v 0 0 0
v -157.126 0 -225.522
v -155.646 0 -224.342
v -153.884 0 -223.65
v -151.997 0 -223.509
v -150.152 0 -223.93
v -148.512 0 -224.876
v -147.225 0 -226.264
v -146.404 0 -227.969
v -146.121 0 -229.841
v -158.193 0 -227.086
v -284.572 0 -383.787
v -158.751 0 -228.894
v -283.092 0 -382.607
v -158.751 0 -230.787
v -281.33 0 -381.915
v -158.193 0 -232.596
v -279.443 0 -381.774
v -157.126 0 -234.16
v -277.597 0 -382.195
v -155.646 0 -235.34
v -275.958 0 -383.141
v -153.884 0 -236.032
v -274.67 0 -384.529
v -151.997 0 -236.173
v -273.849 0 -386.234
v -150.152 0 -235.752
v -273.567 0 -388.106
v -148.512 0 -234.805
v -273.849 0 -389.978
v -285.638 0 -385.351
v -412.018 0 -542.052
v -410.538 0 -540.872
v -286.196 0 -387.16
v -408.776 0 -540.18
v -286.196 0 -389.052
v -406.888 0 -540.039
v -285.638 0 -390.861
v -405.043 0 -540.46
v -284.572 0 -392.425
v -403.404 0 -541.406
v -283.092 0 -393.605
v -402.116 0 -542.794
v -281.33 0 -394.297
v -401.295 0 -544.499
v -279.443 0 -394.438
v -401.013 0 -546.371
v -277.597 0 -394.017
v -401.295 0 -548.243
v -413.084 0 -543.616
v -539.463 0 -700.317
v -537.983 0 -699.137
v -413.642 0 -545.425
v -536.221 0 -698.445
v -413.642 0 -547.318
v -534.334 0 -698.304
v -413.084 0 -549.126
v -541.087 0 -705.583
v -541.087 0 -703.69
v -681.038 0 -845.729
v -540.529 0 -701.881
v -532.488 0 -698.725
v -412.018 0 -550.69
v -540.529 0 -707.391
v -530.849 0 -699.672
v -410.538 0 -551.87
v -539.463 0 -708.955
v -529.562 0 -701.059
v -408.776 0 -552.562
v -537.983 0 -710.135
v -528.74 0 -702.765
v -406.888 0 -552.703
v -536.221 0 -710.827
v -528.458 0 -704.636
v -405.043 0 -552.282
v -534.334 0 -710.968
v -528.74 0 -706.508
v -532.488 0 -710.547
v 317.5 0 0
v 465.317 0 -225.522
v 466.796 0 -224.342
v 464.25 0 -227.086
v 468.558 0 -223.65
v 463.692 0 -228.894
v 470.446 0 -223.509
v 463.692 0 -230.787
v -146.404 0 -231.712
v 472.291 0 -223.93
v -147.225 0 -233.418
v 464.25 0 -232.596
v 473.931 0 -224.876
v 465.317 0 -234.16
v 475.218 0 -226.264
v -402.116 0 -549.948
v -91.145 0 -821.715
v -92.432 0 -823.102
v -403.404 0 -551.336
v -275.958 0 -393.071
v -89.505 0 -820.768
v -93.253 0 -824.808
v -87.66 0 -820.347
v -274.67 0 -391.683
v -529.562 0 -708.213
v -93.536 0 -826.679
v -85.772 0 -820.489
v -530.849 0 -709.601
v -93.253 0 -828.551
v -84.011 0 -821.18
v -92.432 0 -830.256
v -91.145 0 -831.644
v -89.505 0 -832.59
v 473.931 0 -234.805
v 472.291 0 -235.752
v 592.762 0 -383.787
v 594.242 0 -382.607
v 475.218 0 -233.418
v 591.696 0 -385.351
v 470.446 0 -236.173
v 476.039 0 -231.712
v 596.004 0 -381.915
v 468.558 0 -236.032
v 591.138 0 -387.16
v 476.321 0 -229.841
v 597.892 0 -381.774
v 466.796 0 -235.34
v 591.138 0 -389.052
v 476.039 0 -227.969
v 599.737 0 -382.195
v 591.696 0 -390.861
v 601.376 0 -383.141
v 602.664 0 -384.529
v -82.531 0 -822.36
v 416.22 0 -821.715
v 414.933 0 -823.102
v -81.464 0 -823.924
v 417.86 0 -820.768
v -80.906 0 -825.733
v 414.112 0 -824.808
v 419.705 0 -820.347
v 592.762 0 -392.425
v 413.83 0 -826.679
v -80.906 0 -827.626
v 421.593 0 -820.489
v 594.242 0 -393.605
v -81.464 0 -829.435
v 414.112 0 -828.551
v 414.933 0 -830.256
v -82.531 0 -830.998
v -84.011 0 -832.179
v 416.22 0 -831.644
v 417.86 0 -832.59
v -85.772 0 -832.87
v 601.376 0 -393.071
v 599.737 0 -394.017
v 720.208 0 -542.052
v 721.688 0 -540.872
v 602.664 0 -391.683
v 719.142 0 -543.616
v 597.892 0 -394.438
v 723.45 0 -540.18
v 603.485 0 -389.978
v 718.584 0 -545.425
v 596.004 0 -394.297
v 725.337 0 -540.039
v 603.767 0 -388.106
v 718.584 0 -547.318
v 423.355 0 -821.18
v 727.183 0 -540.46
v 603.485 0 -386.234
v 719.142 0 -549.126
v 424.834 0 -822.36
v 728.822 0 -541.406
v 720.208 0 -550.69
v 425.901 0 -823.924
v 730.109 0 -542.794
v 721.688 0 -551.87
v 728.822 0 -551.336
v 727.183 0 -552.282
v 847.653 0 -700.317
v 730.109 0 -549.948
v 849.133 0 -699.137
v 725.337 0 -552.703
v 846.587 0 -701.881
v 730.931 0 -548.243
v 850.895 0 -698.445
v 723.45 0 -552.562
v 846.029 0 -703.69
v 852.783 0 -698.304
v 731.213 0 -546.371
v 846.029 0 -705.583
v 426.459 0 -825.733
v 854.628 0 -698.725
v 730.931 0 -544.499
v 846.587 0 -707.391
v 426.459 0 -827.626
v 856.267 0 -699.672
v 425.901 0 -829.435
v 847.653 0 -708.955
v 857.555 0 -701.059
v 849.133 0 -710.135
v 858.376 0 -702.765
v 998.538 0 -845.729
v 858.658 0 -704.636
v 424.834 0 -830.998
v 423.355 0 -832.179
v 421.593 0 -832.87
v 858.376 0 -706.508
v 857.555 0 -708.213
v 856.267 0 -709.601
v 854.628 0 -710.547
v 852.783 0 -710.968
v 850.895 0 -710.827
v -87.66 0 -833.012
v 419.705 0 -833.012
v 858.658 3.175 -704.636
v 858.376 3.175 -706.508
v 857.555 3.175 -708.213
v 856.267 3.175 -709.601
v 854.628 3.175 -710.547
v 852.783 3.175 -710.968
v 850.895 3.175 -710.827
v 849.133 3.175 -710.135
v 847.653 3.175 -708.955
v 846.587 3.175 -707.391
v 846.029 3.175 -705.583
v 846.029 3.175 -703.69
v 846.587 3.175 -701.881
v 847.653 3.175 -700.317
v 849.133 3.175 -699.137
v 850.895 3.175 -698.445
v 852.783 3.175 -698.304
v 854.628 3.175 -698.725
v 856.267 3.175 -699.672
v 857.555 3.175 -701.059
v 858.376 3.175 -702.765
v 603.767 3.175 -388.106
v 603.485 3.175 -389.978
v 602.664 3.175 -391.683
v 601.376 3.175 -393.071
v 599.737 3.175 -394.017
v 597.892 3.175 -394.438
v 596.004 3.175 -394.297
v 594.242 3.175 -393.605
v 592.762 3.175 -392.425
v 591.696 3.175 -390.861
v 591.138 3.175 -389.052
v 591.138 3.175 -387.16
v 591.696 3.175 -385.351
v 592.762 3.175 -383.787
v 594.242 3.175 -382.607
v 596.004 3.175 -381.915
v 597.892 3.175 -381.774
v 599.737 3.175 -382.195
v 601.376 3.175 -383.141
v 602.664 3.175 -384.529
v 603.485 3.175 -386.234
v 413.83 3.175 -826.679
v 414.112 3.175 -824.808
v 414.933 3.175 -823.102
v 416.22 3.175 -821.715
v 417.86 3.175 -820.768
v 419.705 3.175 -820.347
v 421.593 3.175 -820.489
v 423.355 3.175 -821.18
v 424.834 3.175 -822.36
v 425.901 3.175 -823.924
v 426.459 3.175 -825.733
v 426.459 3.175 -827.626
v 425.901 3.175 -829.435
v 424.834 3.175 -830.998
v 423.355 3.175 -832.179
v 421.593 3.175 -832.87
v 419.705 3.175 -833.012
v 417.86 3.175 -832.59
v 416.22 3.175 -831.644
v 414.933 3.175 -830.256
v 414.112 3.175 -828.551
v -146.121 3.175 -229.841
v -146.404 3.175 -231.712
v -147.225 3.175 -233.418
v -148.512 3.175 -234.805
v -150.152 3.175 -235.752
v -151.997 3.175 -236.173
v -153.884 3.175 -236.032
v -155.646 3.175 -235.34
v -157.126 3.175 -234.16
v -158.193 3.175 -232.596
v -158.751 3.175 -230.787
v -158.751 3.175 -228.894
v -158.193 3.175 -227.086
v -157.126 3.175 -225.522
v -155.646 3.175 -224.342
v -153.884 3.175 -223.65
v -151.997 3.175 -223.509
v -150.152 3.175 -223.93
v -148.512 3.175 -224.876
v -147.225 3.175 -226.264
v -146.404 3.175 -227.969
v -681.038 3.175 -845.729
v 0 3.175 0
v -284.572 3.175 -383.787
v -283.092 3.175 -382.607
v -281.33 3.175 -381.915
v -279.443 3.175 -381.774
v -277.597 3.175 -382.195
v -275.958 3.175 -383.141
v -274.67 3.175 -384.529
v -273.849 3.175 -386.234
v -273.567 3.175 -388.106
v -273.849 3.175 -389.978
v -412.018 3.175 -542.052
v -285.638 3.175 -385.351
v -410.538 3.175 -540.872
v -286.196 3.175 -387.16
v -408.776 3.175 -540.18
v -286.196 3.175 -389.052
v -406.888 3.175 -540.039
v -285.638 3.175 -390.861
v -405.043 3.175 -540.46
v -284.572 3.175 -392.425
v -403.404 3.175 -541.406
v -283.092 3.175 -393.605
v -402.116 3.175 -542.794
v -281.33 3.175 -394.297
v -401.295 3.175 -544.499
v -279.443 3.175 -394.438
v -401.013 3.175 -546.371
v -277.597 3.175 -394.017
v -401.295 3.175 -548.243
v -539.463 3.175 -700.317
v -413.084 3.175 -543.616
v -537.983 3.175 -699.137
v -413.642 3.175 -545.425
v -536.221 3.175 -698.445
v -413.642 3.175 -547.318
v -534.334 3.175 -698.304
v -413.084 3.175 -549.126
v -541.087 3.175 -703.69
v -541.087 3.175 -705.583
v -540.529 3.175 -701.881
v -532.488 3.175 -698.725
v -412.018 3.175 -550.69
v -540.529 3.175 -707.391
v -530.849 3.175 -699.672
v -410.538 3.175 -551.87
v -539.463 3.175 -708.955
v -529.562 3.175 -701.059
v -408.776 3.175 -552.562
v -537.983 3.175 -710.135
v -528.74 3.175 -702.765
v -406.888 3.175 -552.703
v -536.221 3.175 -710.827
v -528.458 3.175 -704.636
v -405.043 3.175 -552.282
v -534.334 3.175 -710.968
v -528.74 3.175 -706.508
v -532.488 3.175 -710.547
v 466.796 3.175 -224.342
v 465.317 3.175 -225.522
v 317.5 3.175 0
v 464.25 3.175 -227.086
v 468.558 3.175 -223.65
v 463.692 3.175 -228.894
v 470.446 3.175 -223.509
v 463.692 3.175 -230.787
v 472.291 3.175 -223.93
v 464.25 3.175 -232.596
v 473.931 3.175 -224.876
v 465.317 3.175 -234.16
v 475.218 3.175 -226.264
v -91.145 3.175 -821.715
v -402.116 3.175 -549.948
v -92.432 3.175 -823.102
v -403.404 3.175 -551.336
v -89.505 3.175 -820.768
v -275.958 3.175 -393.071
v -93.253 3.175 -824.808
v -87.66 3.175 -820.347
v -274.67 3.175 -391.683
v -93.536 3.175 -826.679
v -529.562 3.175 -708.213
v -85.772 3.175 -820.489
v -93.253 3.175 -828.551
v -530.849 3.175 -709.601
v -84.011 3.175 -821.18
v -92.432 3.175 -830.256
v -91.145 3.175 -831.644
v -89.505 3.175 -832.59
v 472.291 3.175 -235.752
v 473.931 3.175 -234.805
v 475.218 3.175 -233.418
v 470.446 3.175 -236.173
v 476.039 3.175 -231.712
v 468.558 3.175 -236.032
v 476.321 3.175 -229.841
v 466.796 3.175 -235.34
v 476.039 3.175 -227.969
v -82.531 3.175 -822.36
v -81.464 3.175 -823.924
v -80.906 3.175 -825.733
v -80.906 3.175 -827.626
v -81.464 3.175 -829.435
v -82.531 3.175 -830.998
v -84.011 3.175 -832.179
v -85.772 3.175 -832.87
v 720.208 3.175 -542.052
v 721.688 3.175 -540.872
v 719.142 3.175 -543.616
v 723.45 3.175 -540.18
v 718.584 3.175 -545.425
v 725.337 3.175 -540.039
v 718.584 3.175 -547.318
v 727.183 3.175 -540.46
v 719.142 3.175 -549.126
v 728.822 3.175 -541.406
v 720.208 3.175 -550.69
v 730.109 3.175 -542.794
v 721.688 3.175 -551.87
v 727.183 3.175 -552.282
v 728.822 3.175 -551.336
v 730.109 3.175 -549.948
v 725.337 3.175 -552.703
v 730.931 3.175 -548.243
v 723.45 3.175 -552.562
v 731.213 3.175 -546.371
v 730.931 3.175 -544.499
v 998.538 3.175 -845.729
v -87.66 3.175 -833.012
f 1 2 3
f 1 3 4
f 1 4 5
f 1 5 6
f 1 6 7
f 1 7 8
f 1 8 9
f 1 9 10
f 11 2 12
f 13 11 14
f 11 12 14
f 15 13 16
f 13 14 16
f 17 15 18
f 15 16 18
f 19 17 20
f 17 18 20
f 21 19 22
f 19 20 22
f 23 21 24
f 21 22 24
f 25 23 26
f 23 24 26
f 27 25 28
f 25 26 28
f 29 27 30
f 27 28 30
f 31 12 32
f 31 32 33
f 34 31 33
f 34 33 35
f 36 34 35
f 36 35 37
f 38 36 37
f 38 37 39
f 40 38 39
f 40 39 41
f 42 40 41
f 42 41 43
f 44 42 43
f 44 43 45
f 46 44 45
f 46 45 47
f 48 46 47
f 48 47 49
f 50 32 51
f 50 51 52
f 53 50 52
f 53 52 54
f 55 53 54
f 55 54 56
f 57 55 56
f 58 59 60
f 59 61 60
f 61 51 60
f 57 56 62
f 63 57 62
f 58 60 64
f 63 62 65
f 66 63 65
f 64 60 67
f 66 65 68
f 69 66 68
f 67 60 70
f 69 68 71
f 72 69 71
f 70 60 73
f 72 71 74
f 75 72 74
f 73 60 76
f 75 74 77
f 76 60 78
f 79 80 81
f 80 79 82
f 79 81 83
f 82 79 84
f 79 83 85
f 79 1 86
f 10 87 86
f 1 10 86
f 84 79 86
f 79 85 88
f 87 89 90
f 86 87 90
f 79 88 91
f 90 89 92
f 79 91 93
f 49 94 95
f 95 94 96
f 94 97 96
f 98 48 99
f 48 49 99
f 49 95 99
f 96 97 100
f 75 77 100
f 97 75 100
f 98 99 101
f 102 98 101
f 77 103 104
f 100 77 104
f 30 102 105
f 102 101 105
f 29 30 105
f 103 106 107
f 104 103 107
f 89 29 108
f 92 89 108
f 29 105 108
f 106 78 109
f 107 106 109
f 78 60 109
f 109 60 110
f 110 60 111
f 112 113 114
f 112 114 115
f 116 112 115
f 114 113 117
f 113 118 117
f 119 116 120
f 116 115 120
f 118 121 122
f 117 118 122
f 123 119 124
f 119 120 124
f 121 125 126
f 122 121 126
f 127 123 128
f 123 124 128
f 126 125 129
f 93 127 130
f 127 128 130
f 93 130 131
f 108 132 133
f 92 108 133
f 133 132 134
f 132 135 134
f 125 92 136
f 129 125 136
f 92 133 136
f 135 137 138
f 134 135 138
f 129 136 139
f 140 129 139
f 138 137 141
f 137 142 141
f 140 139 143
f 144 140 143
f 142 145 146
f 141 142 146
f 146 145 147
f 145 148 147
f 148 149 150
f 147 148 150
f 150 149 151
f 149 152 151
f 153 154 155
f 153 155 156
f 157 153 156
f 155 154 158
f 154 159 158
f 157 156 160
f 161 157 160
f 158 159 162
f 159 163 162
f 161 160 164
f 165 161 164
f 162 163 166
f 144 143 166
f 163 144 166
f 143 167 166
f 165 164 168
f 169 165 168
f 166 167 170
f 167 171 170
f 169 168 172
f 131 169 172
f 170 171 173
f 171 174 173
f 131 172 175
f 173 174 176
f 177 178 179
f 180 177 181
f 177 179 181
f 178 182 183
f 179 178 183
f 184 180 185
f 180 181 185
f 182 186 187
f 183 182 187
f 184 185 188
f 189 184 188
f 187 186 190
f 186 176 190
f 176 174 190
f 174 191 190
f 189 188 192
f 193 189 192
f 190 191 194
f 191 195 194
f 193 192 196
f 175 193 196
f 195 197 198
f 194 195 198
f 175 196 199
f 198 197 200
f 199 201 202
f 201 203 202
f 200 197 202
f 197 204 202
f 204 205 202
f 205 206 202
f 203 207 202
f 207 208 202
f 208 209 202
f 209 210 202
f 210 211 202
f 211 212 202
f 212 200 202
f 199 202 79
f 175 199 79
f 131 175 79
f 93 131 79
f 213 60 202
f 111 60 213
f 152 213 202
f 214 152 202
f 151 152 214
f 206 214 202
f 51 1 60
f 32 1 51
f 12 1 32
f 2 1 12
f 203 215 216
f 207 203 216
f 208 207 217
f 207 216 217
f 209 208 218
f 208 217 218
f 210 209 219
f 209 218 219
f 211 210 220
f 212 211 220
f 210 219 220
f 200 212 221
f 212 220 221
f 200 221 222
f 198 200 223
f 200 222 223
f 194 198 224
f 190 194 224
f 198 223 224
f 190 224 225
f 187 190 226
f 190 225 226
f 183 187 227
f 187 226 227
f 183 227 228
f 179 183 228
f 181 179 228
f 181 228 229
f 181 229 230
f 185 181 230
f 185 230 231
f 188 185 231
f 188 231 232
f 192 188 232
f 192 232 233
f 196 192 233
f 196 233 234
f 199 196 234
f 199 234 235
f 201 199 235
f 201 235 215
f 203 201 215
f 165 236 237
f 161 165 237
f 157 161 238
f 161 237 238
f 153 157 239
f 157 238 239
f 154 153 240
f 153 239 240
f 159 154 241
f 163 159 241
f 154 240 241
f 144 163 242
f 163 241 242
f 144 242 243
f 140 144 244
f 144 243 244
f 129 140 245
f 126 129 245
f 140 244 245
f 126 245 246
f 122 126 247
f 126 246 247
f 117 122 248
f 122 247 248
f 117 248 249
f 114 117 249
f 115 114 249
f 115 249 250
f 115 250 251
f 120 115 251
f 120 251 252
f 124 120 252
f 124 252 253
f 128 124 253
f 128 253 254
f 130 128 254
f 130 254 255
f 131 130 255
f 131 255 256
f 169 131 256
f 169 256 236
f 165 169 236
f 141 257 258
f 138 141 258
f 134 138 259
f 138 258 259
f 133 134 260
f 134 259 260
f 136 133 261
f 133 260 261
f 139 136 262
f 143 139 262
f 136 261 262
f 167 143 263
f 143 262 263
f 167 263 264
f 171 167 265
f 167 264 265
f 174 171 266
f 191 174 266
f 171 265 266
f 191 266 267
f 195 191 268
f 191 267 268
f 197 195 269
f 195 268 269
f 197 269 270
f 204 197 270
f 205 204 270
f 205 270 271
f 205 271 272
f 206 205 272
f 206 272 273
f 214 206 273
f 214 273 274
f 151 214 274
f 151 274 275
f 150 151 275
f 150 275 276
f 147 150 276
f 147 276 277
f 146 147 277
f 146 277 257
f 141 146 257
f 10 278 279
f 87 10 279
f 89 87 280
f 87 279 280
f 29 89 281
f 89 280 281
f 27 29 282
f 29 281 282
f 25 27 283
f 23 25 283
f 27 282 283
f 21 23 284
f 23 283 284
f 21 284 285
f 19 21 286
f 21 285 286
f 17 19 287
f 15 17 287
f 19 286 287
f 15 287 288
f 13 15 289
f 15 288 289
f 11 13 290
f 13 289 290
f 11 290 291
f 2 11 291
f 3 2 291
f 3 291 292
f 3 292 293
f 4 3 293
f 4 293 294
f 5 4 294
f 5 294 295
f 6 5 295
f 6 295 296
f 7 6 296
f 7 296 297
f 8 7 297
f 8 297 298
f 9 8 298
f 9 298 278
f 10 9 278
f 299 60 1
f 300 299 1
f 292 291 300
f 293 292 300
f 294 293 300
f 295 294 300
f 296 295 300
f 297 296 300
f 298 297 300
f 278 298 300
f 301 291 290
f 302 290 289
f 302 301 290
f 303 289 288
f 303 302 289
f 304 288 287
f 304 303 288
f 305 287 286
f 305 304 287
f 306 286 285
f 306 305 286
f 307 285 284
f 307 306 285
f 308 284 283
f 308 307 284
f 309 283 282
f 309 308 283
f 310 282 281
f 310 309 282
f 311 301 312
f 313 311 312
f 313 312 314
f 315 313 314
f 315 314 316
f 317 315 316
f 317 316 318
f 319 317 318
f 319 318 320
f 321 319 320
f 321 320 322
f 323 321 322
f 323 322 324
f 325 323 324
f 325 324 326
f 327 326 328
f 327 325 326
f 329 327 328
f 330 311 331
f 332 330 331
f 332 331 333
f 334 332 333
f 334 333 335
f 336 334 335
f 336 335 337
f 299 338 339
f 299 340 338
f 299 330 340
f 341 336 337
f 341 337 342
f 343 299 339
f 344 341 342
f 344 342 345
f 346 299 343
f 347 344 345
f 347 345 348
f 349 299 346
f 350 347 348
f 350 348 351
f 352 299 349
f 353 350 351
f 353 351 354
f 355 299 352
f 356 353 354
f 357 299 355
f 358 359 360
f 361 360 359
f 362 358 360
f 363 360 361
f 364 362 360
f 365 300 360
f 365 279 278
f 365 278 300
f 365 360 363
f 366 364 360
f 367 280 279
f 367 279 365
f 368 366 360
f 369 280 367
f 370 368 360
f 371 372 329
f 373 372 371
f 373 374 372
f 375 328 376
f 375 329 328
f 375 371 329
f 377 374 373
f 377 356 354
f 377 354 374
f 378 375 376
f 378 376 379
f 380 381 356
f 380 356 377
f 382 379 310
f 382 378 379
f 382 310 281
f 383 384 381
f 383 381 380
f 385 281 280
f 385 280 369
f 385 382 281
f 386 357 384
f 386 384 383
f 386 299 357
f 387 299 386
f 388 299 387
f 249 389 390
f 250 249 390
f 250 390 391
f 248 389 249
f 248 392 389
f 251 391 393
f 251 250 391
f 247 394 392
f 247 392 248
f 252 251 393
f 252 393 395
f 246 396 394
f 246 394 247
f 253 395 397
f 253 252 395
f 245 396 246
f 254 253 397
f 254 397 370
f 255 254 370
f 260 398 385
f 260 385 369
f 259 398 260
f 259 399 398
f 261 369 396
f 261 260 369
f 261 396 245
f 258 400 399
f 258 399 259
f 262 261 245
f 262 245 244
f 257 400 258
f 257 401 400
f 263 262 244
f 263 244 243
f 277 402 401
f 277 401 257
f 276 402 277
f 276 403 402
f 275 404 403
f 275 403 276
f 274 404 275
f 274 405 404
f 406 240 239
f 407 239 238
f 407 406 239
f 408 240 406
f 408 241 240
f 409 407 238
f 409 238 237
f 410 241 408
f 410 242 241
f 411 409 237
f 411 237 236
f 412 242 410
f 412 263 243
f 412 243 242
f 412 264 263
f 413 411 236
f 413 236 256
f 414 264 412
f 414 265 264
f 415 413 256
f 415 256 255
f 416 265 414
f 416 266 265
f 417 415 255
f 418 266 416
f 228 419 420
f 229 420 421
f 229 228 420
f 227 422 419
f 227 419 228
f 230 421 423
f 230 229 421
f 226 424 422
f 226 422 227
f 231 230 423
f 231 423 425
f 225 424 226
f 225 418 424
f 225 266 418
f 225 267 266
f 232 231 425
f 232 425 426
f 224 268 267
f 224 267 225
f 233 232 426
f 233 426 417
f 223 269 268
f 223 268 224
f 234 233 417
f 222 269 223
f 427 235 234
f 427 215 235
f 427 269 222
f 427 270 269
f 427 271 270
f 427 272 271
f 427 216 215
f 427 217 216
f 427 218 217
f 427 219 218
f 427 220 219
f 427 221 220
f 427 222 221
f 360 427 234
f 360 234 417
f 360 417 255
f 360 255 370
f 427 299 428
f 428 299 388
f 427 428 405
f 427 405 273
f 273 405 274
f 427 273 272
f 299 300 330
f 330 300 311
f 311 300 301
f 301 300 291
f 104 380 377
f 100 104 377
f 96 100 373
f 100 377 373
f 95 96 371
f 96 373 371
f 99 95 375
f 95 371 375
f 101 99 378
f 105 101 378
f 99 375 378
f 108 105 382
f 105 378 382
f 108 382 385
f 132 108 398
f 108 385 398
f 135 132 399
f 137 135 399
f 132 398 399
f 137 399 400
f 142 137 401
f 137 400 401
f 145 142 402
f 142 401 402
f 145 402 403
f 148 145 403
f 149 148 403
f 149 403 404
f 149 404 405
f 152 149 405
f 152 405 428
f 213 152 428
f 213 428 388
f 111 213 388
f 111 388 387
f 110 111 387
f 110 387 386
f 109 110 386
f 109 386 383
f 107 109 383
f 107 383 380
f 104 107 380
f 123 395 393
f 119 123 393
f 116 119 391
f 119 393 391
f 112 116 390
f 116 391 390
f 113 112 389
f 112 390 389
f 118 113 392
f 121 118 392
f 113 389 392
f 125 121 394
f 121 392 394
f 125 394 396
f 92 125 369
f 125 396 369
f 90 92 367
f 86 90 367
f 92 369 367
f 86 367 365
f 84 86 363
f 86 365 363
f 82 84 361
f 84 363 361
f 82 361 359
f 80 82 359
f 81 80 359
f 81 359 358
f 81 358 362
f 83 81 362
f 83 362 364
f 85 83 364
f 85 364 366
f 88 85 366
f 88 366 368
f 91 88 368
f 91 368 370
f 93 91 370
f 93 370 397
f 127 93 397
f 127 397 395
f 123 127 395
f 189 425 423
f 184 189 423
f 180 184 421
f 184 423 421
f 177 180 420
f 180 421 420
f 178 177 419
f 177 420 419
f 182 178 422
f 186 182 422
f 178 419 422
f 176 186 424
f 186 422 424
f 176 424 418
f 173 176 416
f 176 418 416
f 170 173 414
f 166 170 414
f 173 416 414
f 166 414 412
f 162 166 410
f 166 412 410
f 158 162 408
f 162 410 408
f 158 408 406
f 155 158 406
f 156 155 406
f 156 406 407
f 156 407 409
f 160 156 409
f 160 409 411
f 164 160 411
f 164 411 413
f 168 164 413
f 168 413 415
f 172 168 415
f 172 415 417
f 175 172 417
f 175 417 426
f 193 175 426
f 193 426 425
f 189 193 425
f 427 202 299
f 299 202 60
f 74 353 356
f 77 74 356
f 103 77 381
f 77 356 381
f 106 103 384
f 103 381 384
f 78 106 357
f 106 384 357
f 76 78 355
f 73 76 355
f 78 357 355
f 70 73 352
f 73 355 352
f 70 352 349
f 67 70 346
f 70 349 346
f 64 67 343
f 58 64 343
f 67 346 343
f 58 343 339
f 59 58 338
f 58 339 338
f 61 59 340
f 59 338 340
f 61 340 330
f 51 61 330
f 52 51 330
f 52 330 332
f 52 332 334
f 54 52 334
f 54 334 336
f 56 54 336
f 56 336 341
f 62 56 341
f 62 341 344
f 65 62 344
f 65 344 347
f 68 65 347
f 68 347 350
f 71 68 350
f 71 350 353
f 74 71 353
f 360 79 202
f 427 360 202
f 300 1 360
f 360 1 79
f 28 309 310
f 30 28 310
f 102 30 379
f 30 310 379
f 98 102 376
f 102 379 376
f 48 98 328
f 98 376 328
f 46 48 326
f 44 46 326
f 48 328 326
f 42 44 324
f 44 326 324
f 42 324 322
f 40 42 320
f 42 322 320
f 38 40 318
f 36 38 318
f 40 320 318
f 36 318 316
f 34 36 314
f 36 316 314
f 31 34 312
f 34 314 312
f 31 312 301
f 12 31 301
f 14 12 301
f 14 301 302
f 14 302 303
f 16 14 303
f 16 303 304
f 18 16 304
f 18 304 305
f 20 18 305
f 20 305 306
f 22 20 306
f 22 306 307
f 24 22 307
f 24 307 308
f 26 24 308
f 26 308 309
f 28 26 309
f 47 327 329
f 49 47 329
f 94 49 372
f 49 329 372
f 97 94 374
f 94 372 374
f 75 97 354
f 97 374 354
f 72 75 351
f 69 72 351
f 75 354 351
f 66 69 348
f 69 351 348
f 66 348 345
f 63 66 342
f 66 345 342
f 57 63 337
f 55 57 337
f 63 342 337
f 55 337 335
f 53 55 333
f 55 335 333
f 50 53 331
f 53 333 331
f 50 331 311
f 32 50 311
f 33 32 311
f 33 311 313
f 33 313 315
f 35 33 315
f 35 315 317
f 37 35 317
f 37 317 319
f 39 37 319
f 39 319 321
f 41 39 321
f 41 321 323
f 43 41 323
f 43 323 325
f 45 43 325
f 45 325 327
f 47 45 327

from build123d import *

# Parameters (mm, degrees)
BOSS_EXTRUDE1_DEPTH = 3.175
CUT_EXTRUDE1_REACH  = 5.175
SKETCH2_R           = 6.35
SKETCH4_R           = 6.35
CUT_EXTRUDE2_DEPTH  = 4.175


with BuildPart() as part:
    # Sketch1 → Boss-Extrude1 (new body)
    with BuildSketch(Plane(origin=(0, 0, 0), x_dir=(1, 0, 0), z_dir=(0, 1, 0))):
        Polygon((0, 0), (317.5, 0), (998.5375, 845.729357474), (-681.0375, 845.729357474), align=None)
    extrude(amount=BOSS_EXTRUDE1_DEPTH)

    # Sketch2 → Cut-Extrude1 (cut, up to next)
    with BuildSketch(Plane(origin=(0, 3.175, 0), x_dir=(-1, 0, 0), z_dir=(0, 1, 0)), mode=Mode.PRIVATE) as cut_extrude1_sk1:
        with Locations((87.1855, -826.679357474)):
            Circle(SKETCH2_R)
    cut_extrude1_tool1 = extrude(cut_extrude1_sk1.sketch, amount=-CUT_EXTRUDE1_REACH, mode=Mode.PRIVATE) & part.part
    add(cut_extrude1_tool1.solids().sort_by_distance((-87.1855, 3.175, -826.679357))[0], mode=Mode.SUBTRACT)
    # Sketch2 → Cut-Extrude1 (cut, up to next)
    with BuildSketch(Plane(origin=(0, 3.175, 0), x_dir=(-1, 0, 0), z_dir=(0, 1, 0)), mode=Mode.PRIVATE) as cut_extrude1_sk2:
        with Locations((-420.1795, -826.679357474)):
            Circle(SKETCH2_R)
    cut_extrude1_tool2 = extrude(cut_extrude1_sk2.sketch, amount=-CUT_EXTRUDE1_REACH, mode=Mode.PRIVATE) & part.part
    add(cut_extrude1_tool2.solids().sort_by_distance((420.1795, 3.175, -826.679357))[0], mode=Mode.SUBTRACT)

    # Sketch4 → Cut-Extrude2 (cut, through all)
    with BuildSketch(Plane(origin=(0, 3.175, 0), x_dir=(1, 0, 0), z_dir=(0, 1, 0))):
        with Locations((852.308331977, 704.636230713)):
            Circle(SKETCH4_R)
        with Locations((469.971489871, 229.840801956)):
            Circle(SKETCH4_R)
        with Locations((724.862717941, 546.371087794)):
            Circle(SKETCH4_R)
        with Locations((597.417103906, 388.105944875)):
            Circle(SKETCH4_R)
        with Locations((-534.808331977, 704.636230713)):
            Circle(SKETCH4_R)
        with Locations((-407.362717941, 546.371087794)):
            Circle(SKETCH4_R)
        with Locations((-279.917103906, 388.105944875)):
            Circle(SKETCH4_R)
        with Locations((-152.471489871, 229.840801956)):
            Circle(SKETCH4_R)
    extrude(amount=-CUT_EXTRUDE2_DEPTH, mode=Mode.SUBTRACT)


solid = part.part
